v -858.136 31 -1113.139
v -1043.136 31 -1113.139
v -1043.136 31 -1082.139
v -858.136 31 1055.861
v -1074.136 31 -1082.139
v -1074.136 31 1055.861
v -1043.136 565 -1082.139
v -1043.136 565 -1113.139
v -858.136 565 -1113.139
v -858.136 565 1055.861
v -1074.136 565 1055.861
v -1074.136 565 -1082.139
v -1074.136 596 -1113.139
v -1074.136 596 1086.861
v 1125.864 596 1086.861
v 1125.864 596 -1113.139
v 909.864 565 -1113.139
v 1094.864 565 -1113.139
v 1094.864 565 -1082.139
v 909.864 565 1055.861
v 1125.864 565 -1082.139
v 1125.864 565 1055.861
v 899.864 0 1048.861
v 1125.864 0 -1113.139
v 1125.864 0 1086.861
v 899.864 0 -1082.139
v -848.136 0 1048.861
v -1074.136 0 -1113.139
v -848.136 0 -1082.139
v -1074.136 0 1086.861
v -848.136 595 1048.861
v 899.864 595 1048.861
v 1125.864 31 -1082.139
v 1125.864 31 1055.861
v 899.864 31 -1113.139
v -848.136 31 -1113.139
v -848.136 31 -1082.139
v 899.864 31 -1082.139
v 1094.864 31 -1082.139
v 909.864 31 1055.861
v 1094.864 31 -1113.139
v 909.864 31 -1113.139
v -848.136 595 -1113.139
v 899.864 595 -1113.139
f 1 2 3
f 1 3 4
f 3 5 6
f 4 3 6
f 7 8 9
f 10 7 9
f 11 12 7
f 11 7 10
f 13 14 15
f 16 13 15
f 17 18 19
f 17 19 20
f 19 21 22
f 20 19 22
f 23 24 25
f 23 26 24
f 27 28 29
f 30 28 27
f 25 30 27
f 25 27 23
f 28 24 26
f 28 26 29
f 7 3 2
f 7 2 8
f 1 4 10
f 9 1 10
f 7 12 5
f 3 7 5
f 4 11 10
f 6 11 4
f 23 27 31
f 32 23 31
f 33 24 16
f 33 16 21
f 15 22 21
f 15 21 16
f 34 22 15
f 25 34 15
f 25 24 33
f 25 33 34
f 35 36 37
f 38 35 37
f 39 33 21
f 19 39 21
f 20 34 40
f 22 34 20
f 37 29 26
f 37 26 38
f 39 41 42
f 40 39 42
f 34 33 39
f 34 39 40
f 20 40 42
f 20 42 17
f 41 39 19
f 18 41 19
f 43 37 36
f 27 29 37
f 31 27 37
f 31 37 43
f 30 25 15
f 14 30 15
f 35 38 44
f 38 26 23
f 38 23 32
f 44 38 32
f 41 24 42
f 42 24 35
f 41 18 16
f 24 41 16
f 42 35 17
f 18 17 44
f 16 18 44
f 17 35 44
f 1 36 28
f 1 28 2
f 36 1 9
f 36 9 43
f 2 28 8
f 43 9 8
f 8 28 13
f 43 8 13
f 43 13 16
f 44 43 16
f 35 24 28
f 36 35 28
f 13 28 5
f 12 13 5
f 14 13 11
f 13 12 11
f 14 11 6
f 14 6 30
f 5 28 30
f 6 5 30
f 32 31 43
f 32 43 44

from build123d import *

# Parameters (mm, degrees)
F0_W      = 2200
F0_H      = 2200
F1_DEPTH  = 596
F2_W      = 1748
F2_H      = 595
F3_DEPTH  = 2415.503973
F4_W      = 596
F4_H      = 38
F5_DEPTH  = 1753.233517
F6_W      = 31
F6_H      = 31
F7_DEPTH  = 1759.984374
F8_W      = 534
F8_H      = 2138
F9_DEPTH  = 216
F10_W     = 185
F10_H     = 534
F11_DEPTH = 295.372376
F12_W     = 534
F12_H     = 2138
F13_DEPTH = 216
F14_W     = 185
F14_H     = 534
F15_DEPTH = 871.478731


with BuildPart() as f1:
    # F0 (on Front) → F1 (new body)
    with BuildSketch(Plane.XZ):
        with Locations((25.864166, -13.139114)):
            Rectangle(F0_W, F0_H)
    extrude(amount=-F1_DEPTH)

    # F2 (on face) → F3 (cut)
    with BuildSketch(Plane.XY.offset(1086.860886)):
        with Locations((25.864166, 297.5)):
            Rectangle(F2_W, F2_H)
    extrude(amount=-F3_DEPTH, mode=Mode.SUBTRACT)

    # F4 (on face) → F5 (join)
    with BuildSketch(Plane.YZ.offset(-848.135834)):
        with Locations((298, 1067.860886)):
            Rectangle(F4_W, F4_H)
    extrude(amount=F5_DEPTH)

    # F6 (on face) → F7 (join)
    with BuildSketch(Plane.YZ.offset(-848.135834)):
        with Locations((15.5, -1097.639114)):
            Rectangle(F6_W, F6_H)
    extrude(amount=F7_DEPTH)

    # F8 (on face) → F9 (cut)
    with BuildSketch(Plane.YZ.offset(1125.864166)):
        with Locations((298, -13.139114)):
            Rectangle(F8_W, F8_H)
    extrude(amount=-F9_DEPTH, mode=Mode.SUBTRACT)

    # F10 (on face) → F11 (cut)
    with BuildSketch(Plane.XY.offset(-1082.139114)):
        with Locations((1002.364166, 298)):
            Rectangle(F10_W, F10_H)
    extrude(amount=-F11_DEPTH, mode=Mode.SUBTRACT)

    # F12 (on face) → F13 (cut)
    with BuildSketch(Plane(origin=(-1074.135834, 0, 0), x_dir=(0, -1, 0), z_dir=(-1, 0, 0))):
        with Locations((-298, -13.139114)):
            Rectangle(F12_W, F12_H)
    extrude(amount=-F13_DEPTH, mode=Mode.SUBTRACT)

    # F14 (on face) → F15 (cut)
    with BuildSketch(Plane.XY.offset(-1082.139114)):
        with Locations((-950.635834, 298)):
            Rectangle(F14_W, F14_H)
    extrude(amount=-F15_DEPTH, mode=Mode.SUBTRACT)


solid = f1.part
